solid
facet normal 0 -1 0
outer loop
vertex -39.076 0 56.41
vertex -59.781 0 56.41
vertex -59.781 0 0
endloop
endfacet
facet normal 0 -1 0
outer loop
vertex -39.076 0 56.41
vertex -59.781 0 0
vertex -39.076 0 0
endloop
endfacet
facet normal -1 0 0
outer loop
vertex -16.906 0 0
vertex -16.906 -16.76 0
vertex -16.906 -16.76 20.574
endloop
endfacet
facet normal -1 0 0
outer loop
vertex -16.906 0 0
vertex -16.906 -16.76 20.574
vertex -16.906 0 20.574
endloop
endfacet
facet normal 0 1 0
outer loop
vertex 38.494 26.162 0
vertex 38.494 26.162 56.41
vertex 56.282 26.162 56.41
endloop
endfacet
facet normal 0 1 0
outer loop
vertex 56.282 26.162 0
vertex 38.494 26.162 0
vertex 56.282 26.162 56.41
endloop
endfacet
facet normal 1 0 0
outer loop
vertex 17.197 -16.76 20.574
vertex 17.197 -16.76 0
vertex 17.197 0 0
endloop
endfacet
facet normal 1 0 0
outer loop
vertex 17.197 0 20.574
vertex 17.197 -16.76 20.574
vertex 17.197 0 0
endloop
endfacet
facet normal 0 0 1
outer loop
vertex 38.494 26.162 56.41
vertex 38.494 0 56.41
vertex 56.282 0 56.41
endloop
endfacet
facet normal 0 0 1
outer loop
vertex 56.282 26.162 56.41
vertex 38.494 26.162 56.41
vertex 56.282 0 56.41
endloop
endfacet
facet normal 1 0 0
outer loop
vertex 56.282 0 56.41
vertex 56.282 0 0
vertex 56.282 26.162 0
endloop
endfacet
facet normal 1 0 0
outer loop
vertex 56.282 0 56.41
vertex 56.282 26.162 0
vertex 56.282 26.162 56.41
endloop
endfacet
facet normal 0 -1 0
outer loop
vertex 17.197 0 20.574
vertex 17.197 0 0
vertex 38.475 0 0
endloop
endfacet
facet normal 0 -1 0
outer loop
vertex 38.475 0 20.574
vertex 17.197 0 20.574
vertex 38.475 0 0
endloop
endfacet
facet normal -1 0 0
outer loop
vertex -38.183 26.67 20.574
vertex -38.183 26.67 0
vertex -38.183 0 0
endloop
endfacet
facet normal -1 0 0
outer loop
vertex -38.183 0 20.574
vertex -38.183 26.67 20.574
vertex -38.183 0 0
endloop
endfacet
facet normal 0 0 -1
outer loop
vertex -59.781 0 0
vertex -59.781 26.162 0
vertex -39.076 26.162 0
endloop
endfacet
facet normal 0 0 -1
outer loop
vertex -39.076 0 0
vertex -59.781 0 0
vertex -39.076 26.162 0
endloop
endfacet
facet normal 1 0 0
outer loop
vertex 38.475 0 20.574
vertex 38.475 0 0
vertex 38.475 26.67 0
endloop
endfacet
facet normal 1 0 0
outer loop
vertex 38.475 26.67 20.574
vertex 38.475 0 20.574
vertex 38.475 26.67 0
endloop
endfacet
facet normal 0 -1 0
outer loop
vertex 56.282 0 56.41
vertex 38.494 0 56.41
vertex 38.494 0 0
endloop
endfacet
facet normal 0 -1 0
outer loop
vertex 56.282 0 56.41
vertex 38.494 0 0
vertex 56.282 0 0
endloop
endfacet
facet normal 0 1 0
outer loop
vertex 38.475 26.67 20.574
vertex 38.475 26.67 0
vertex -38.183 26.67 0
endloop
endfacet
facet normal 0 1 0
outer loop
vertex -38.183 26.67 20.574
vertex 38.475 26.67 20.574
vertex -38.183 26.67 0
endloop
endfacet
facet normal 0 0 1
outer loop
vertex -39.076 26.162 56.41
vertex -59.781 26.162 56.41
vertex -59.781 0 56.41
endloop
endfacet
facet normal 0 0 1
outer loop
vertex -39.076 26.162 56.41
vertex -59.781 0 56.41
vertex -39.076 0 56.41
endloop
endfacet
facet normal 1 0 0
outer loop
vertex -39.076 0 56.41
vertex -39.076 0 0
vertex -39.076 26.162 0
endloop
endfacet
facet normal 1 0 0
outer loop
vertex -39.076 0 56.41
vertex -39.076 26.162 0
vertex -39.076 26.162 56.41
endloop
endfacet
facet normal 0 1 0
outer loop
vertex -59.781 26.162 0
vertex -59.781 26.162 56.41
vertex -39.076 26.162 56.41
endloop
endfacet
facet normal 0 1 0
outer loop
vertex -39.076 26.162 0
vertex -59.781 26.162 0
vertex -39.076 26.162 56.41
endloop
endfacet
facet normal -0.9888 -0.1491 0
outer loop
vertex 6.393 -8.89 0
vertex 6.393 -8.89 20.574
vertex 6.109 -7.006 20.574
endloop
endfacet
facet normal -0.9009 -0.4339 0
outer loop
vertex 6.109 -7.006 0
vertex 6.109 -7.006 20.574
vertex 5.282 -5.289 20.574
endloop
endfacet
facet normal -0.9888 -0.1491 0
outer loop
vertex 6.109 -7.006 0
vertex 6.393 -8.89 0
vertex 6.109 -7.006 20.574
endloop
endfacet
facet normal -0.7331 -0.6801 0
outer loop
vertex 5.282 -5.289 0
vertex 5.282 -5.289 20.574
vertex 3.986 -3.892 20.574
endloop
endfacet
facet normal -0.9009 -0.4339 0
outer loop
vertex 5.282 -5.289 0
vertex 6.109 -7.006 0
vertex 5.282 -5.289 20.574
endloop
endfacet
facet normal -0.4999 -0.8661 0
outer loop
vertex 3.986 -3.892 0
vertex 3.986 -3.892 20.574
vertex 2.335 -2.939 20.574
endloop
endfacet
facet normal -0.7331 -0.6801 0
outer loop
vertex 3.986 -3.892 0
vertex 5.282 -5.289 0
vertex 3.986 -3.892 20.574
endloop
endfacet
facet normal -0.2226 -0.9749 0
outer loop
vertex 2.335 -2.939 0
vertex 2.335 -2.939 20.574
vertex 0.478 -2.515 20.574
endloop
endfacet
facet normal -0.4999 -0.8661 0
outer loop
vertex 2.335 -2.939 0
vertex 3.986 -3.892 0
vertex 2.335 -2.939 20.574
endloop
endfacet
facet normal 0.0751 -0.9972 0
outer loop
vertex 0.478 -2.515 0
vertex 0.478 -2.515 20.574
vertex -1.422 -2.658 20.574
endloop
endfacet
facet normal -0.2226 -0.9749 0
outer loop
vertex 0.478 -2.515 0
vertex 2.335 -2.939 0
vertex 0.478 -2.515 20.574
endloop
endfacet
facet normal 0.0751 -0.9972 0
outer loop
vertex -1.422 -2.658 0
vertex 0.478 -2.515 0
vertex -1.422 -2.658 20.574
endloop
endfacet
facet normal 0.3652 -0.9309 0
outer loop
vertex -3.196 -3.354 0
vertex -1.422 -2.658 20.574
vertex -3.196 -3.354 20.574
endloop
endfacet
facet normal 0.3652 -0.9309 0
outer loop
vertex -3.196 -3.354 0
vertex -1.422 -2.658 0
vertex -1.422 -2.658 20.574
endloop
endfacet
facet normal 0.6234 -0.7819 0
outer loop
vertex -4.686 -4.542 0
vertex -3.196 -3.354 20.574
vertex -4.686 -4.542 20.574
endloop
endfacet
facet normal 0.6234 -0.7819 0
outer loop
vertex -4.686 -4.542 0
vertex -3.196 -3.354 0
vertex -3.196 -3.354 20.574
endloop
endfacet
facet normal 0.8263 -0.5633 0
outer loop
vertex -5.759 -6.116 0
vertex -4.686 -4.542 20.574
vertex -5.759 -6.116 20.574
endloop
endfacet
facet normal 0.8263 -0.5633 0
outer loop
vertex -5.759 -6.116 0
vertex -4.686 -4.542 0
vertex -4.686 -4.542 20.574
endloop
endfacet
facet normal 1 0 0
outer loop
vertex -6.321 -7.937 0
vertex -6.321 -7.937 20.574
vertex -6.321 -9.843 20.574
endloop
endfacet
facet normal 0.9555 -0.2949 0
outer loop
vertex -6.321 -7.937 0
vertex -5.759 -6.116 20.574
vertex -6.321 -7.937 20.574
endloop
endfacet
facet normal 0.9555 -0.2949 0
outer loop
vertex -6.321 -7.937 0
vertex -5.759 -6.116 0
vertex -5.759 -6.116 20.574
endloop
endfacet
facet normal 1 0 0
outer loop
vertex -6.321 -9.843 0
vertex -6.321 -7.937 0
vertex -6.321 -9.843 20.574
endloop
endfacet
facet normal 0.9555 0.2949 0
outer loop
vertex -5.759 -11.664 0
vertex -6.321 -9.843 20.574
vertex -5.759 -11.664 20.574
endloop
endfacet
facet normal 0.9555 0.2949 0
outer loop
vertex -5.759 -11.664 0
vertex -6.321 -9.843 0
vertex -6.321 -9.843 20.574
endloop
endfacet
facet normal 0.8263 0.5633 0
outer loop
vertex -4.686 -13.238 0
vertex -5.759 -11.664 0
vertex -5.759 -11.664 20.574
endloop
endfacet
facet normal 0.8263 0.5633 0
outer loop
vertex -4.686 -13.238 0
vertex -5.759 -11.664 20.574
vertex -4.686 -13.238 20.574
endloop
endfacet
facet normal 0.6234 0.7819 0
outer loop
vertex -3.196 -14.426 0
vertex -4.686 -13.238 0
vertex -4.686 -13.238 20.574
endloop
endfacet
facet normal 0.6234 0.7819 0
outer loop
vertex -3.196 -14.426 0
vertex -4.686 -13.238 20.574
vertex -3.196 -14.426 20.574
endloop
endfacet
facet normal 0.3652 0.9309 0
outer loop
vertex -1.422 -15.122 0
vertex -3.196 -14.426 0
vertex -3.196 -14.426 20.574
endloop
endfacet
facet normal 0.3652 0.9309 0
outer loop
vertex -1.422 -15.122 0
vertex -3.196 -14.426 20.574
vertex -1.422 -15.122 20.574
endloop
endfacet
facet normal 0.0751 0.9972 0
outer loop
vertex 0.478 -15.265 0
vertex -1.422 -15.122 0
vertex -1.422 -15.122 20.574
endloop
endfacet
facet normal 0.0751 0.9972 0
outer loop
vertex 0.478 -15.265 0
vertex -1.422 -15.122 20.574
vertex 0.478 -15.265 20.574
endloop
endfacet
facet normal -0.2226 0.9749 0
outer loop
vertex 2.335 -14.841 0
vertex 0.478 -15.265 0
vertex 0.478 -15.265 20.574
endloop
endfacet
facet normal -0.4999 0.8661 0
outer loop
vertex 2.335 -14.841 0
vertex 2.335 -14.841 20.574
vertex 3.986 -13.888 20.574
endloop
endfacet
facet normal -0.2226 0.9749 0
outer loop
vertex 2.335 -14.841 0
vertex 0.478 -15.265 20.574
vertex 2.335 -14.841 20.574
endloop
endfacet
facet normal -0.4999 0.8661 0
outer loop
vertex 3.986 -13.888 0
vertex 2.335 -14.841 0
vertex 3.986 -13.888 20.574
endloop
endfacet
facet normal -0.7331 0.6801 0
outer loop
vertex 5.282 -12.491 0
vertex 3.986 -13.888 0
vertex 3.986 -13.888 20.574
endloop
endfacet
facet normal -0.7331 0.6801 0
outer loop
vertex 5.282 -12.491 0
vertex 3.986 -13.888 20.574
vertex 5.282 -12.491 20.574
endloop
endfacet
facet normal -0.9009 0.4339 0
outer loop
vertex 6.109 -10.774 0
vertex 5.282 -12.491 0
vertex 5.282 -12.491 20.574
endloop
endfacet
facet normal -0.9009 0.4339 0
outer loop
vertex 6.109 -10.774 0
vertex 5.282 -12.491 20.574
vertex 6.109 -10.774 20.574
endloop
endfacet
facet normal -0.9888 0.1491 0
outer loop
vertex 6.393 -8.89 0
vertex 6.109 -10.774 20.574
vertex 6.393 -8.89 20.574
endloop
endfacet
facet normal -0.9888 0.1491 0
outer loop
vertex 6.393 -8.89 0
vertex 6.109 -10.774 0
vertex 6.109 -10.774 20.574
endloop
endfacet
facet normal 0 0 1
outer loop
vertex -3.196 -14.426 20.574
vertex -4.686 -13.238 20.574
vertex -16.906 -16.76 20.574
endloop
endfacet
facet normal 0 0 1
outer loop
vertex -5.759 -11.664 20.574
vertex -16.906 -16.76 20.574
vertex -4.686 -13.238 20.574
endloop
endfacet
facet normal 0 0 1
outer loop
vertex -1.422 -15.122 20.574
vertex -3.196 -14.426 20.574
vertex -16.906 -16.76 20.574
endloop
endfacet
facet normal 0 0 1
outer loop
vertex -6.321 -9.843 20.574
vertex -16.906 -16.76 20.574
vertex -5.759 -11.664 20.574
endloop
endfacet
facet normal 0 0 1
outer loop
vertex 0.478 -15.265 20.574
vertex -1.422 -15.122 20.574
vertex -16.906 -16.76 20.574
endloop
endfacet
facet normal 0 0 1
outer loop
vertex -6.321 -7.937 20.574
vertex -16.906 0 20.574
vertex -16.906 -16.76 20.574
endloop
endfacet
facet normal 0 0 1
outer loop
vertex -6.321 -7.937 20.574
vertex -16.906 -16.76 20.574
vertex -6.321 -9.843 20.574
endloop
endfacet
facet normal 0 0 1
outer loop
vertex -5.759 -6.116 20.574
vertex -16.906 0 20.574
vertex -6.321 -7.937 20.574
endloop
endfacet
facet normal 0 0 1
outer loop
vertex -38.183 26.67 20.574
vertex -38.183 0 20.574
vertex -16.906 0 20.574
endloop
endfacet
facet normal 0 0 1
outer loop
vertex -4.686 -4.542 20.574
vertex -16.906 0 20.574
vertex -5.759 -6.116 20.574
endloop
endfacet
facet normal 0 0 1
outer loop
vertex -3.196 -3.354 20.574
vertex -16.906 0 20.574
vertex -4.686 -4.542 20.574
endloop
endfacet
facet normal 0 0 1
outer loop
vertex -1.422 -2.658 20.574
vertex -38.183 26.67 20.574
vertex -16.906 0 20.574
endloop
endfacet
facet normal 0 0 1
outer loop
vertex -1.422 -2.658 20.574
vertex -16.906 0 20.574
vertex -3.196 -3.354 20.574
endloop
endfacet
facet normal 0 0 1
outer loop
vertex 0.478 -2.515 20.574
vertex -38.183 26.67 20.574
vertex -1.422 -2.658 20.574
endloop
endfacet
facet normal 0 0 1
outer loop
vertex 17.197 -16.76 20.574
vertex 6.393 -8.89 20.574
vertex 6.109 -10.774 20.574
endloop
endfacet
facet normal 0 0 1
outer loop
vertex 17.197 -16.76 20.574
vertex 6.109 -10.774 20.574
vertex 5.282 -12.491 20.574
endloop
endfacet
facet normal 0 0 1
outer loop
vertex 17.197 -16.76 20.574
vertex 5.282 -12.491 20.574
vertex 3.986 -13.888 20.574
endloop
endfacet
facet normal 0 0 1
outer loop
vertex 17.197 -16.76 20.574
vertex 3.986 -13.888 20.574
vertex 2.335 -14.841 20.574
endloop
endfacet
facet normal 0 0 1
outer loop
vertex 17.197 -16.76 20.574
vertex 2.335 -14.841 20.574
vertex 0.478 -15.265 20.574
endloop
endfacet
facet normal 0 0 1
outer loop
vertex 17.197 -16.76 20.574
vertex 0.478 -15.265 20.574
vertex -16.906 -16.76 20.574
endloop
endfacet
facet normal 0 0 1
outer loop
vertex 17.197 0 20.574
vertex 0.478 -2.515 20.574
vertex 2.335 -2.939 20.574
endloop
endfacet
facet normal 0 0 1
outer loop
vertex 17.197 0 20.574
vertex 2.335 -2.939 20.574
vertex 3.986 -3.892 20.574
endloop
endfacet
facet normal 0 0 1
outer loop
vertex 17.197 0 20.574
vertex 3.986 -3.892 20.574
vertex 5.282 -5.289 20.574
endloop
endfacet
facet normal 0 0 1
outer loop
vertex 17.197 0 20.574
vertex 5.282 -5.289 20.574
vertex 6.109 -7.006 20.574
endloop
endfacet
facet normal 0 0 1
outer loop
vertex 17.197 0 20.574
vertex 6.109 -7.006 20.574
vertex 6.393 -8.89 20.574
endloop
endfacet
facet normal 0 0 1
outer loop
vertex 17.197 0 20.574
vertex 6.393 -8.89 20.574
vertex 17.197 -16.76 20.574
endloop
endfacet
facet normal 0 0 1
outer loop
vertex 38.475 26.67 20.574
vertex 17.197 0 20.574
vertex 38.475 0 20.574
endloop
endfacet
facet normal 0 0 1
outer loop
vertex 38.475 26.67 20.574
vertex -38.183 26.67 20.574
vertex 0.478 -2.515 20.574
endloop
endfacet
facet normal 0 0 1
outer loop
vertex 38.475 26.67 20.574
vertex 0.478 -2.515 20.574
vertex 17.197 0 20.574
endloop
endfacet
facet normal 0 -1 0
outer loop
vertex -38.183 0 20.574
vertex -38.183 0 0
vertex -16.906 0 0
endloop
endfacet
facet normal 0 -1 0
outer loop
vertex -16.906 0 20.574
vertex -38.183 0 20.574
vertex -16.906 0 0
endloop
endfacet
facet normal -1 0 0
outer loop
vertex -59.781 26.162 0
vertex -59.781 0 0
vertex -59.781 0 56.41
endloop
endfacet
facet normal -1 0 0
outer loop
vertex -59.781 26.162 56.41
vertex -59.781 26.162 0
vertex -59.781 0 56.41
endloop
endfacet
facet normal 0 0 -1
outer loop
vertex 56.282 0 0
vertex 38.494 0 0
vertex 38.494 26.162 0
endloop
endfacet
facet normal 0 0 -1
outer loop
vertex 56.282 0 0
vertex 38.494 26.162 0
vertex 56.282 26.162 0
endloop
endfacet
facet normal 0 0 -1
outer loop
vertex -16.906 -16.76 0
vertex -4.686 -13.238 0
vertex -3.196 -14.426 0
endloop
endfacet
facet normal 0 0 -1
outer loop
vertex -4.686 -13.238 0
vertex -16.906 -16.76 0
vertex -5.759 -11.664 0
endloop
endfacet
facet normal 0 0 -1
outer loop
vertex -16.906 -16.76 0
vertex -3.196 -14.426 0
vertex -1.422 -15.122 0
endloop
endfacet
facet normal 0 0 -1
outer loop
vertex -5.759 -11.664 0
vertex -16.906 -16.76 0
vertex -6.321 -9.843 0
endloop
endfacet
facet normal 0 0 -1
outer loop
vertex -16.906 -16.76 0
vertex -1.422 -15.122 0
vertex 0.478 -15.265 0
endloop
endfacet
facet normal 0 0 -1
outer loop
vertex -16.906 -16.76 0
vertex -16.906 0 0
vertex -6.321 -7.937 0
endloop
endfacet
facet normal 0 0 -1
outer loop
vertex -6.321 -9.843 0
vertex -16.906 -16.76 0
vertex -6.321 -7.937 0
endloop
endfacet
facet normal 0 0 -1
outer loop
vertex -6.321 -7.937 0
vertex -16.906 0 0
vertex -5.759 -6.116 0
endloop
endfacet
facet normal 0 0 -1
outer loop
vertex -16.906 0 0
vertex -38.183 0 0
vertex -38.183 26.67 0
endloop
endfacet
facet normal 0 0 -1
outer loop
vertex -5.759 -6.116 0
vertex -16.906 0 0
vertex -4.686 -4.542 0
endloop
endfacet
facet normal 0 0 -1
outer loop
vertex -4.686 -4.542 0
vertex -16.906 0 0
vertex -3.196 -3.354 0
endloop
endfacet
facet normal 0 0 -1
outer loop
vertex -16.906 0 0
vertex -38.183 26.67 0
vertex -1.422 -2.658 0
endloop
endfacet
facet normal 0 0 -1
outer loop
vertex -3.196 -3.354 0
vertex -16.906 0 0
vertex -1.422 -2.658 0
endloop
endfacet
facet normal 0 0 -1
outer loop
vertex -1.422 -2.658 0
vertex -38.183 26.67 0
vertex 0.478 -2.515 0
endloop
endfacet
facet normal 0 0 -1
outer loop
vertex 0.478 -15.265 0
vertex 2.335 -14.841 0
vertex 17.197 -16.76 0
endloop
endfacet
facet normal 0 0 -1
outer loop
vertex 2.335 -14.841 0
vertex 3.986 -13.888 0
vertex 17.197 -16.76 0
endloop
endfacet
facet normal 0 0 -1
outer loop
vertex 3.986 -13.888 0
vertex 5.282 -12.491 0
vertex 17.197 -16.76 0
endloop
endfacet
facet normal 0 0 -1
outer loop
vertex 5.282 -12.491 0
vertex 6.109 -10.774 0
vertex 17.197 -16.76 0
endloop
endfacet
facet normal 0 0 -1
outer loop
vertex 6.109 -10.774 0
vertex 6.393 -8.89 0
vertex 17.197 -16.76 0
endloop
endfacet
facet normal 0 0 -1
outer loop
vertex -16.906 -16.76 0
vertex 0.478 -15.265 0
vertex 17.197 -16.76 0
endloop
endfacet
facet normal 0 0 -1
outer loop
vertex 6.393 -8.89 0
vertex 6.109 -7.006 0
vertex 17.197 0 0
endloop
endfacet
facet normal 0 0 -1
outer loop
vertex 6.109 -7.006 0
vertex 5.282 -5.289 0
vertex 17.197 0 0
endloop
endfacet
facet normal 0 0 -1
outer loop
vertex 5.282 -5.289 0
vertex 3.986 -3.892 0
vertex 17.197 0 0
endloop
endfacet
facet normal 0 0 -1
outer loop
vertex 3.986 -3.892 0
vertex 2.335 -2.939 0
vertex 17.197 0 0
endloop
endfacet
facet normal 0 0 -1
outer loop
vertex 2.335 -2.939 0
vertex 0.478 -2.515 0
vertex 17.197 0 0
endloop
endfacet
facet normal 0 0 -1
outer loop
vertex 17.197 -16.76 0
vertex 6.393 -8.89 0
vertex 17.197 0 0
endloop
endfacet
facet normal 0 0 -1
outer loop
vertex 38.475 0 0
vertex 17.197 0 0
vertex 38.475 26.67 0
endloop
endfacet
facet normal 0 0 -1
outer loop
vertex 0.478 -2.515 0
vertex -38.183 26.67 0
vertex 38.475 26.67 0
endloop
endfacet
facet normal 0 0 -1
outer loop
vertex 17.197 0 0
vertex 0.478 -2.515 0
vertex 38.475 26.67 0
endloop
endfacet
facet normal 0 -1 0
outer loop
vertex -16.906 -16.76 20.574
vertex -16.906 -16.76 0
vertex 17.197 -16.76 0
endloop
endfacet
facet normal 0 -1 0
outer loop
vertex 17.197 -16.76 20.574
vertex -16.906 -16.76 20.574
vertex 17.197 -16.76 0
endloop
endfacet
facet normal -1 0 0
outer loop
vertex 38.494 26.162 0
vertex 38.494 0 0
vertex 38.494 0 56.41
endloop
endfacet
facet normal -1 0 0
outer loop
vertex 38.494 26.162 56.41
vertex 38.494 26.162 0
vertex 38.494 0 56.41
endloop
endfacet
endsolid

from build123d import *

# Parameters (mm, degrees)
F0_W     = 34.102624
F0_H     = 16.759835
F1_DEPTH = 20.574
F2_W     = 20.704717
F2_H     = 56.410454
F2_W_2   = 17.788556
F3_DEPTH = 26.162
F4_R     = 6.392555
F5_DEPTH = 70.358


with BuildPart() as f1:
    # F0 (on Top) → F1 (new body)
    with BuildSketch(Plane.XY):
        Polygon((-38.183279, 0), (-16.905574, 0), (17.19705, 0), (38.474757, 0), (38.474757, 26.670001), (-38.183279, 26.670001), align=None)
        with Locations((0.145738, -8.379917)):
            Rectangle(F0_W, F0_H)
    extrude(amount=F1_DEPTH)

    # F4 (on Top) → F5 (cut)
    with BuildSketch(Plane.XY):
        with Locations((0, -8.89)):
            Circle(F4_R)
    extrude(amount=F5_DEPTH, mode=Mode.SUBTRACT)


with BuildPart() as f3:
    # F2 (on Front) → F3 (new body)
    with BuildSketch(Plane.XZ):
        with Locations((-49.42859, 28.205227)):
            Rectangle(F2_W, F2_H)
        with Locations((47.38784, 28.205227)):
            Rectangle(F2_W_2, F2_H)
    extrude(amount=-F3_DEPTH)


solid = Compound([f1.part, f3.part])
